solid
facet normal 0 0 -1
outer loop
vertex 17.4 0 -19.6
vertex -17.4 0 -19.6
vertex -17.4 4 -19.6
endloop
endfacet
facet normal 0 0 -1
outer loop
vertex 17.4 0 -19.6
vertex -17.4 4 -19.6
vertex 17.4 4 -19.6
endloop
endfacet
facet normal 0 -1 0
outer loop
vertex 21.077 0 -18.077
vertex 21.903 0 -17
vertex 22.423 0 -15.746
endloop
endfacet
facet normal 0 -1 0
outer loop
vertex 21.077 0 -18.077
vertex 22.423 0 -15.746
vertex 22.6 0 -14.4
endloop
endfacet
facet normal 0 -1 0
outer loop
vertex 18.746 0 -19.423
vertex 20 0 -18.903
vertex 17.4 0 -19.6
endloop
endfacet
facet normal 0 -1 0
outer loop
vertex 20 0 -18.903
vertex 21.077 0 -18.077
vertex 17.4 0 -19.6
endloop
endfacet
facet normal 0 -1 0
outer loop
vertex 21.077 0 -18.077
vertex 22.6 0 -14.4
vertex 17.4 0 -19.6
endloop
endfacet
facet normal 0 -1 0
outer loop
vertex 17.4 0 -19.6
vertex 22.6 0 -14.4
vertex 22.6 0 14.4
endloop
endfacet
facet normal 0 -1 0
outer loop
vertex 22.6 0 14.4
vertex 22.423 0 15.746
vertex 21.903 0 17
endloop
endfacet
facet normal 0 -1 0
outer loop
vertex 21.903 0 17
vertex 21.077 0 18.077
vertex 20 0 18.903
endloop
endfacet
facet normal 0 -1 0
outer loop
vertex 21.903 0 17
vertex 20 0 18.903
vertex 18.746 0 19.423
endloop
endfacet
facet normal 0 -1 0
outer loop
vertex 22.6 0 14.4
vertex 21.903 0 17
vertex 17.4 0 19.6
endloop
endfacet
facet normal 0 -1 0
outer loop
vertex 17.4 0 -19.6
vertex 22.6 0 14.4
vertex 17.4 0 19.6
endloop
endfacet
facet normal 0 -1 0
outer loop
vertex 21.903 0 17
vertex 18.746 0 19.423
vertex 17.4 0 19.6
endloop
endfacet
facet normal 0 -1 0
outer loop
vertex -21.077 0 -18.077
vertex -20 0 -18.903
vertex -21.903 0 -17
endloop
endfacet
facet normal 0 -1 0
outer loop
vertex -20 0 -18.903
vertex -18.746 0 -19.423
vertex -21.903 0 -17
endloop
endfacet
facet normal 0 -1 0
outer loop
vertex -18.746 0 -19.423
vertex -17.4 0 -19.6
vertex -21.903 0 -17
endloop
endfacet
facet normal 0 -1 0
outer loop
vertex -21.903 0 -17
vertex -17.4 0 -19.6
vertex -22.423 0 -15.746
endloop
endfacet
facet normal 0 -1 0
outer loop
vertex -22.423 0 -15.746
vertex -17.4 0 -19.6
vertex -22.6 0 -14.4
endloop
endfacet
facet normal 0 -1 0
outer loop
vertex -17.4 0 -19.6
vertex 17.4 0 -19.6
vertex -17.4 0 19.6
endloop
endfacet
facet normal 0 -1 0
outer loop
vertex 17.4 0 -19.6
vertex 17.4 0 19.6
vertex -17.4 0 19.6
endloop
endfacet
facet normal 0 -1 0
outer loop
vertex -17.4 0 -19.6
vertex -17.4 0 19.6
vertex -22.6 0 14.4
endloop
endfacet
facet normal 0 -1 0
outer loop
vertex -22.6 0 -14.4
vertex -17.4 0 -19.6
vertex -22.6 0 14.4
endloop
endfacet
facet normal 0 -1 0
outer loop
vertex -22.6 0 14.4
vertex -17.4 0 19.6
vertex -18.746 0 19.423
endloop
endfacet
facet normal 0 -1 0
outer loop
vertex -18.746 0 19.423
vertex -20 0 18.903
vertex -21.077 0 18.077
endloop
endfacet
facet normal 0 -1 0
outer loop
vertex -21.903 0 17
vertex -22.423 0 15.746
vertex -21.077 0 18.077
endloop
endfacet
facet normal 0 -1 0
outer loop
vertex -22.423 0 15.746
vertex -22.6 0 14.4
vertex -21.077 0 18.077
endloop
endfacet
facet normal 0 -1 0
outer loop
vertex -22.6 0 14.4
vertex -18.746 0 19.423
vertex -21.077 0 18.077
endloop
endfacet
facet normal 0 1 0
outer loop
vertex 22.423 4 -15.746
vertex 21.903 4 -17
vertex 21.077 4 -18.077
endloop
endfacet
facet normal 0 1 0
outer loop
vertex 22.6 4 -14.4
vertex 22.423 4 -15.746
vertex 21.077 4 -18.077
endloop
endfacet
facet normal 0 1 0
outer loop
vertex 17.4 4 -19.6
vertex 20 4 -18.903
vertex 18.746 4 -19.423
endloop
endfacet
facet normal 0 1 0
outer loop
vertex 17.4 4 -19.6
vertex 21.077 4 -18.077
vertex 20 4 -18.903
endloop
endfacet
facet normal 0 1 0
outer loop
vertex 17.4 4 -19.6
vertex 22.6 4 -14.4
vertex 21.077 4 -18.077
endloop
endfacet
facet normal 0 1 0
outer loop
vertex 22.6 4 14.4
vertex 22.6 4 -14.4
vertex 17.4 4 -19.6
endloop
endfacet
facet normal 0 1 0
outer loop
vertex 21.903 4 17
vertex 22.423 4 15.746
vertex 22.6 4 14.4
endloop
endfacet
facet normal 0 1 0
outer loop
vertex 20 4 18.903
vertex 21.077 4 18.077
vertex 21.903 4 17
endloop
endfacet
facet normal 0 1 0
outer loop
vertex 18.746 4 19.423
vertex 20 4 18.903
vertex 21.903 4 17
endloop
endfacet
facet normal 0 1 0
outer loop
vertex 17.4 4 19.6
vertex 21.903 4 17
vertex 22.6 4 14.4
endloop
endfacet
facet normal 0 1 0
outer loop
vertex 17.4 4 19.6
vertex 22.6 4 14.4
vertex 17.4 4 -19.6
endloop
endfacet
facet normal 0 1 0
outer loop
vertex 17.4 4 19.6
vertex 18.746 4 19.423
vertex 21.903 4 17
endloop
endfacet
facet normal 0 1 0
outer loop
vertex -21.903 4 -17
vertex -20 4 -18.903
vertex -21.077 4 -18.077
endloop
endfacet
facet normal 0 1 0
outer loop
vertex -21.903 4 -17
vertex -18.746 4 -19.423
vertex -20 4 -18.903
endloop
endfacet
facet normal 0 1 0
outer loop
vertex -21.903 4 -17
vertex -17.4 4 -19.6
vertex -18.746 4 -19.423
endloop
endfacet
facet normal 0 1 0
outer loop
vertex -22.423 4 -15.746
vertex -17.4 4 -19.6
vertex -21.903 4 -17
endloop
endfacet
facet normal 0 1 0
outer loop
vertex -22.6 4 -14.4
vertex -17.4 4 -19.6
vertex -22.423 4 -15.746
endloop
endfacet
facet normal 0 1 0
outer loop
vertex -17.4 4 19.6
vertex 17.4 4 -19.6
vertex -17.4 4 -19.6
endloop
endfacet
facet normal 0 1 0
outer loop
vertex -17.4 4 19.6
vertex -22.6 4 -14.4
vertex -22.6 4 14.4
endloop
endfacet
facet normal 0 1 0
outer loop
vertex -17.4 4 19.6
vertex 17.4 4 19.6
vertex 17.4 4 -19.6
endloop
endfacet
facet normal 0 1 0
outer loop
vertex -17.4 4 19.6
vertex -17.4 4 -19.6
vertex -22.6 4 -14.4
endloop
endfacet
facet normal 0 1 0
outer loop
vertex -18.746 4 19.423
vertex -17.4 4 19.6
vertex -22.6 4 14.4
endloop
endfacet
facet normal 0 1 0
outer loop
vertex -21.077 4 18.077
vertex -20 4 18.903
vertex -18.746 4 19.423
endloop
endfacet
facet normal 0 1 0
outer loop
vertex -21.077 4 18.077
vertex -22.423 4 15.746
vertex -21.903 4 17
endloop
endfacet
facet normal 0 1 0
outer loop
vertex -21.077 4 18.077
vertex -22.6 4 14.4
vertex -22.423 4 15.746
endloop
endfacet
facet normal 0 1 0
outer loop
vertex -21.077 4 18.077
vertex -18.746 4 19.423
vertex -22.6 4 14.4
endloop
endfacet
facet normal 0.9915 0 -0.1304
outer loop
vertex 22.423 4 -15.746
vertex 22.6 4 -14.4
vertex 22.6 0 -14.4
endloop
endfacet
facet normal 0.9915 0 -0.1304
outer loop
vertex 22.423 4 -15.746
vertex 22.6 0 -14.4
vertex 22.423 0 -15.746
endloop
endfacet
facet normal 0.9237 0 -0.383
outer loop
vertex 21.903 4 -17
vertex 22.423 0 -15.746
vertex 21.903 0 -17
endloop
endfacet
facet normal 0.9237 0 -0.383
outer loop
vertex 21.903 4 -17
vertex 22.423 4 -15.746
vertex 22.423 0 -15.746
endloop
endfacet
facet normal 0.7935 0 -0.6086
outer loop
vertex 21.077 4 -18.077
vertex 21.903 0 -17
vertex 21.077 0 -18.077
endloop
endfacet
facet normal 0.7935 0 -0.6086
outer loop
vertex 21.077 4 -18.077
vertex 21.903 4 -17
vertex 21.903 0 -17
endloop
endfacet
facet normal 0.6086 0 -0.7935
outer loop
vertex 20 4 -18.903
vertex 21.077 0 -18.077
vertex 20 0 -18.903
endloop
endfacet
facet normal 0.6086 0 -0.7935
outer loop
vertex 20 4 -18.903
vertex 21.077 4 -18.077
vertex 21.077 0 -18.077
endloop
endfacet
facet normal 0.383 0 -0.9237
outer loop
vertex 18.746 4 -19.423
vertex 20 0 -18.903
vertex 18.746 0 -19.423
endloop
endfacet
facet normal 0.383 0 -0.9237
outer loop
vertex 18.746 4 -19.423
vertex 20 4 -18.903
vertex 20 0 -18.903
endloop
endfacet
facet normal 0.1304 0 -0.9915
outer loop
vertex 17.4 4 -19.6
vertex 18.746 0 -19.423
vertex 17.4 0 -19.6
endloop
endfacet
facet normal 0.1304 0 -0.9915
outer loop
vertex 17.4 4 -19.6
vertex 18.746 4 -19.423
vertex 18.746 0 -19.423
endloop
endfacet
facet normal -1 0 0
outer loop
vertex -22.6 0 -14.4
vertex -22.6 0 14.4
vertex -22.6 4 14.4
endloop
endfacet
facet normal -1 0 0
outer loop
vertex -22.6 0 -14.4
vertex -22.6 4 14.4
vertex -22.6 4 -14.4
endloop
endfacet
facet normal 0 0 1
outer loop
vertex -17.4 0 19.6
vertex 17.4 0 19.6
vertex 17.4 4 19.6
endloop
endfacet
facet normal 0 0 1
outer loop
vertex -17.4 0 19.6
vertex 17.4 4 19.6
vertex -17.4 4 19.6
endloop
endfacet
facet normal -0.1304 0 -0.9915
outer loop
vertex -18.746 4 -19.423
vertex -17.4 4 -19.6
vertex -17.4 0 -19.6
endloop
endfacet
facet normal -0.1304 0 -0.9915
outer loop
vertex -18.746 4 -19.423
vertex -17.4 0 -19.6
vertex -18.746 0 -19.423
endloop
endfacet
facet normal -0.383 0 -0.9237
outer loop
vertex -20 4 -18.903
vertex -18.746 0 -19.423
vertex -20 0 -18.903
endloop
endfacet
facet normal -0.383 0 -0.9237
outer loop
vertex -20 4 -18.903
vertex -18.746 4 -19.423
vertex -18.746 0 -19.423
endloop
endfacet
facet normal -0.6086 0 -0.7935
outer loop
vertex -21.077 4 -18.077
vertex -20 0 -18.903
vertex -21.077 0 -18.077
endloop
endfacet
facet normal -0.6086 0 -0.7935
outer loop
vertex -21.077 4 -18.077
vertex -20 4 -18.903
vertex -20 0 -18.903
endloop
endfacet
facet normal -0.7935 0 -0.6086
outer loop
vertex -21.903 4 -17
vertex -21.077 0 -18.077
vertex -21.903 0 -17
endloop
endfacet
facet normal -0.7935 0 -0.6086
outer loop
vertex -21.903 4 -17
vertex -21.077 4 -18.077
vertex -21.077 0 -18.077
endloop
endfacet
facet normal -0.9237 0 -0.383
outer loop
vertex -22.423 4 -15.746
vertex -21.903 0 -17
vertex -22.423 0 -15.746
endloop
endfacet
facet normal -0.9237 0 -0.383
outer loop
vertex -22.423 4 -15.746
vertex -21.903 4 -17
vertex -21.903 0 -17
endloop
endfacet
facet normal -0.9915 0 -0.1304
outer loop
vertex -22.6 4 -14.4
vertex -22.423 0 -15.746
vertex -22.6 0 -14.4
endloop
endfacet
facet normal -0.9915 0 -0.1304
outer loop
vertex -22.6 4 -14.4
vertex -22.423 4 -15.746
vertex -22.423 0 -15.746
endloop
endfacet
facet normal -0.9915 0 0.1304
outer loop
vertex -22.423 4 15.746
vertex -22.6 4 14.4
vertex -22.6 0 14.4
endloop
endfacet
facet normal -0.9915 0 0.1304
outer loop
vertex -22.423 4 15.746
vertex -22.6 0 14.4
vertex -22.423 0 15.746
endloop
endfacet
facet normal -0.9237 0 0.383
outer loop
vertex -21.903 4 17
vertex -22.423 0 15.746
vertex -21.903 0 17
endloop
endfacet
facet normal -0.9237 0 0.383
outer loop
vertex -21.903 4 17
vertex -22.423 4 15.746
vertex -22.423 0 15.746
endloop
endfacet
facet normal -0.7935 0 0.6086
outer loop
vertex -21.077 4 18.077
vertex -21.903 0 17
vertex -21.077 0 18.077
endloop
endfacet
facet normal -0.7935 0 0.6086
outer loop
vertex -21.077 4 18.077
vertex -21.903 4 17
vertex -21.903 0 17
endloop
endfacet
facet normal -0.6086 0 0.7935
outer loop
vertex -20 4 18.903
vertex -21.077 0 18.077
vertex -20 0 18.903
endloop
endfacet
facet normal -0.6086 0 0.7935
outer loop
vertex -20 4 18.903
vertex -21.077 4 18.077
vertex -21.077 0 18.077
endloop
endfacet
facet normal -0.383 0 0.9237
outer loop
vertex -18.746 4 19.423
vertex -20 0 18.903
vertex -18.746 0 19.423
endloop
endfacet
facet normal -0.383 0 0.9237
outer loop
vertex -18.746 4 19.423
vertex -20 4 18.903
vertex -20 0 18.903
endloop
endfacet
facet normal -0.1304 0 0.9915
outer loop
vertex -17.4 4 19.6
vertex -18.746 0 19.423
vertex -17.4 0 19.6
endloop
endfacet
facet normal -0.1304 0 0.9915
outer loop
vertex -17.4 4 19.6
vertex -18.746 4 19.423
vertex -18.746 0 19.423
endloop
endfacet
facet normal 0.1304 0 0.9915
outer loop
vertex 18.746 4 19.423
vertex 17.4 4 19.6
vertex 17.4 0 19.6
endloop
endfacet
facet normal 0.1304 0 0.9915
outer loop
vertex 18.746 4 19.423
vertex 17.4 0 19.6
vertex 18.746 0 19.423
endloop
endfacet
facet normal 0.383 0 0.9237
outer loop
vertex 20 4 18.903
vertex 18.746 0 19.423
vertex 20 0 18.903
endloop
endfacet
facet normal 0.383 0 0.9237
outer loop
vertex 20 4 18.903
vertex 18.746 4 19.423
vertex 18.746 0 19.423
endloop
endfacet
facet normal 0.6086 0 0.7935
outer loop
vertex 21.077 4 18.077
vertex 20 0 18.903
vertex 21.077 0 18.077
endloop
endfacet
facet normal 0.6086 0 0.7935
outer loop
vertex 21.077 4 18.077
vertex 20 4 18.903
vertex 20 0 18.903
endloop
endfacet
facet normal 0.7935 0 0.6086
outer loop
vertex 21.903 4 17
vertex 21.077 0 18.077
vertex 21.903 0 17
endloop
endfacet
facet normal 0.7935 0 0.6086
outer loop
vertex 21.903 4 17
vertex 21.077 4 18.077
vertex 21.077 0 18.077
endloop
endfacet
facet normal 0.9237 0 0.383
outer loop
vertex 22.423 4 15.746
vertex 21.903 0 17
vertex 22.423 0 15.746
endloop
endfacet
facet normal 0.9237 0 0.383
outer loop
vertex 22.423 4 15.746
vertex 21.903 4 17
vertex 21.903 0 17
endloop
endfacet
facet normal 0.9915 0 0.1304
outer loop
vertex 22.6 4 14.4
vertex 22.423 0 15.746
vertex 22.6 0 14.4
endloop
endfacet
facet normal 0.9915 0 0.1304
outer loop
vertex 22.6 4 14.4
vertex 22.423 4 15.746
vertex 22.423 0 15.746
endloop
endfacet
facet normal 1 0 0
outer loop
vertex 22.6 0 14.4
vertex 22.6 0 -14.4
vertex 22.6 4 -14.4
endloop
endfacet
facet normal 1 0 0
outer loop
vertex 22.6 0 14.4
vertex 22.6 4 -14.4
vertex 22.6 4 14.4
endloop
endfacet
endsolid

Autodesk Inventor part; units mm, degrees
ref_plane "YZ Plane" through (0, 0, 0) normal (1, 0, 0) x (0, 1, 0)
ref_plane "XZ Plane" through (0, 0, 0) normal (0, 1, 0) x (-1, 0, 0)
ref_plane "XY Plane" through (0, 0, 0) normal (0, 0, 1) x (1, 0, 0)
sketch "Sketch1" plane through (0, 0, 0) normal (0, 1, 0) x (-1, 0, 0)
  line L0 (31.64, 0) -> (-31.64, 0) construction
  line L1 (0, -27.44) -> (0, 27.44) construction
  line L2 (-22.6, 19.6) -> (22.6, 19.6)
  line L3 (22.6, 19.6) -> (22.6, -19.6)
  line L4 (22.6, -19.6) -> (-22.6, -19.6)
  line L5 (-22.6, -19.6) -> (-22.6, 19.6)
  line L6 (-22.6, 0) -> (22.6, 0) construction
  point P0 (0, 0)
  dimension "d0" = 45.2
  dimension "d1" = 39.2
extrude "Extrusion1" add sketch "Sketch1" along normal blind 4
fillet "Fillet1" radius 5.2 4 edges at (-22.6, 2, 19.6) (22.6, 2, 19.6) (22.6, 2, -19.6) (-22.6, 2, -19.6)
properties part number "plexiglas_4mm" material "Glass"
